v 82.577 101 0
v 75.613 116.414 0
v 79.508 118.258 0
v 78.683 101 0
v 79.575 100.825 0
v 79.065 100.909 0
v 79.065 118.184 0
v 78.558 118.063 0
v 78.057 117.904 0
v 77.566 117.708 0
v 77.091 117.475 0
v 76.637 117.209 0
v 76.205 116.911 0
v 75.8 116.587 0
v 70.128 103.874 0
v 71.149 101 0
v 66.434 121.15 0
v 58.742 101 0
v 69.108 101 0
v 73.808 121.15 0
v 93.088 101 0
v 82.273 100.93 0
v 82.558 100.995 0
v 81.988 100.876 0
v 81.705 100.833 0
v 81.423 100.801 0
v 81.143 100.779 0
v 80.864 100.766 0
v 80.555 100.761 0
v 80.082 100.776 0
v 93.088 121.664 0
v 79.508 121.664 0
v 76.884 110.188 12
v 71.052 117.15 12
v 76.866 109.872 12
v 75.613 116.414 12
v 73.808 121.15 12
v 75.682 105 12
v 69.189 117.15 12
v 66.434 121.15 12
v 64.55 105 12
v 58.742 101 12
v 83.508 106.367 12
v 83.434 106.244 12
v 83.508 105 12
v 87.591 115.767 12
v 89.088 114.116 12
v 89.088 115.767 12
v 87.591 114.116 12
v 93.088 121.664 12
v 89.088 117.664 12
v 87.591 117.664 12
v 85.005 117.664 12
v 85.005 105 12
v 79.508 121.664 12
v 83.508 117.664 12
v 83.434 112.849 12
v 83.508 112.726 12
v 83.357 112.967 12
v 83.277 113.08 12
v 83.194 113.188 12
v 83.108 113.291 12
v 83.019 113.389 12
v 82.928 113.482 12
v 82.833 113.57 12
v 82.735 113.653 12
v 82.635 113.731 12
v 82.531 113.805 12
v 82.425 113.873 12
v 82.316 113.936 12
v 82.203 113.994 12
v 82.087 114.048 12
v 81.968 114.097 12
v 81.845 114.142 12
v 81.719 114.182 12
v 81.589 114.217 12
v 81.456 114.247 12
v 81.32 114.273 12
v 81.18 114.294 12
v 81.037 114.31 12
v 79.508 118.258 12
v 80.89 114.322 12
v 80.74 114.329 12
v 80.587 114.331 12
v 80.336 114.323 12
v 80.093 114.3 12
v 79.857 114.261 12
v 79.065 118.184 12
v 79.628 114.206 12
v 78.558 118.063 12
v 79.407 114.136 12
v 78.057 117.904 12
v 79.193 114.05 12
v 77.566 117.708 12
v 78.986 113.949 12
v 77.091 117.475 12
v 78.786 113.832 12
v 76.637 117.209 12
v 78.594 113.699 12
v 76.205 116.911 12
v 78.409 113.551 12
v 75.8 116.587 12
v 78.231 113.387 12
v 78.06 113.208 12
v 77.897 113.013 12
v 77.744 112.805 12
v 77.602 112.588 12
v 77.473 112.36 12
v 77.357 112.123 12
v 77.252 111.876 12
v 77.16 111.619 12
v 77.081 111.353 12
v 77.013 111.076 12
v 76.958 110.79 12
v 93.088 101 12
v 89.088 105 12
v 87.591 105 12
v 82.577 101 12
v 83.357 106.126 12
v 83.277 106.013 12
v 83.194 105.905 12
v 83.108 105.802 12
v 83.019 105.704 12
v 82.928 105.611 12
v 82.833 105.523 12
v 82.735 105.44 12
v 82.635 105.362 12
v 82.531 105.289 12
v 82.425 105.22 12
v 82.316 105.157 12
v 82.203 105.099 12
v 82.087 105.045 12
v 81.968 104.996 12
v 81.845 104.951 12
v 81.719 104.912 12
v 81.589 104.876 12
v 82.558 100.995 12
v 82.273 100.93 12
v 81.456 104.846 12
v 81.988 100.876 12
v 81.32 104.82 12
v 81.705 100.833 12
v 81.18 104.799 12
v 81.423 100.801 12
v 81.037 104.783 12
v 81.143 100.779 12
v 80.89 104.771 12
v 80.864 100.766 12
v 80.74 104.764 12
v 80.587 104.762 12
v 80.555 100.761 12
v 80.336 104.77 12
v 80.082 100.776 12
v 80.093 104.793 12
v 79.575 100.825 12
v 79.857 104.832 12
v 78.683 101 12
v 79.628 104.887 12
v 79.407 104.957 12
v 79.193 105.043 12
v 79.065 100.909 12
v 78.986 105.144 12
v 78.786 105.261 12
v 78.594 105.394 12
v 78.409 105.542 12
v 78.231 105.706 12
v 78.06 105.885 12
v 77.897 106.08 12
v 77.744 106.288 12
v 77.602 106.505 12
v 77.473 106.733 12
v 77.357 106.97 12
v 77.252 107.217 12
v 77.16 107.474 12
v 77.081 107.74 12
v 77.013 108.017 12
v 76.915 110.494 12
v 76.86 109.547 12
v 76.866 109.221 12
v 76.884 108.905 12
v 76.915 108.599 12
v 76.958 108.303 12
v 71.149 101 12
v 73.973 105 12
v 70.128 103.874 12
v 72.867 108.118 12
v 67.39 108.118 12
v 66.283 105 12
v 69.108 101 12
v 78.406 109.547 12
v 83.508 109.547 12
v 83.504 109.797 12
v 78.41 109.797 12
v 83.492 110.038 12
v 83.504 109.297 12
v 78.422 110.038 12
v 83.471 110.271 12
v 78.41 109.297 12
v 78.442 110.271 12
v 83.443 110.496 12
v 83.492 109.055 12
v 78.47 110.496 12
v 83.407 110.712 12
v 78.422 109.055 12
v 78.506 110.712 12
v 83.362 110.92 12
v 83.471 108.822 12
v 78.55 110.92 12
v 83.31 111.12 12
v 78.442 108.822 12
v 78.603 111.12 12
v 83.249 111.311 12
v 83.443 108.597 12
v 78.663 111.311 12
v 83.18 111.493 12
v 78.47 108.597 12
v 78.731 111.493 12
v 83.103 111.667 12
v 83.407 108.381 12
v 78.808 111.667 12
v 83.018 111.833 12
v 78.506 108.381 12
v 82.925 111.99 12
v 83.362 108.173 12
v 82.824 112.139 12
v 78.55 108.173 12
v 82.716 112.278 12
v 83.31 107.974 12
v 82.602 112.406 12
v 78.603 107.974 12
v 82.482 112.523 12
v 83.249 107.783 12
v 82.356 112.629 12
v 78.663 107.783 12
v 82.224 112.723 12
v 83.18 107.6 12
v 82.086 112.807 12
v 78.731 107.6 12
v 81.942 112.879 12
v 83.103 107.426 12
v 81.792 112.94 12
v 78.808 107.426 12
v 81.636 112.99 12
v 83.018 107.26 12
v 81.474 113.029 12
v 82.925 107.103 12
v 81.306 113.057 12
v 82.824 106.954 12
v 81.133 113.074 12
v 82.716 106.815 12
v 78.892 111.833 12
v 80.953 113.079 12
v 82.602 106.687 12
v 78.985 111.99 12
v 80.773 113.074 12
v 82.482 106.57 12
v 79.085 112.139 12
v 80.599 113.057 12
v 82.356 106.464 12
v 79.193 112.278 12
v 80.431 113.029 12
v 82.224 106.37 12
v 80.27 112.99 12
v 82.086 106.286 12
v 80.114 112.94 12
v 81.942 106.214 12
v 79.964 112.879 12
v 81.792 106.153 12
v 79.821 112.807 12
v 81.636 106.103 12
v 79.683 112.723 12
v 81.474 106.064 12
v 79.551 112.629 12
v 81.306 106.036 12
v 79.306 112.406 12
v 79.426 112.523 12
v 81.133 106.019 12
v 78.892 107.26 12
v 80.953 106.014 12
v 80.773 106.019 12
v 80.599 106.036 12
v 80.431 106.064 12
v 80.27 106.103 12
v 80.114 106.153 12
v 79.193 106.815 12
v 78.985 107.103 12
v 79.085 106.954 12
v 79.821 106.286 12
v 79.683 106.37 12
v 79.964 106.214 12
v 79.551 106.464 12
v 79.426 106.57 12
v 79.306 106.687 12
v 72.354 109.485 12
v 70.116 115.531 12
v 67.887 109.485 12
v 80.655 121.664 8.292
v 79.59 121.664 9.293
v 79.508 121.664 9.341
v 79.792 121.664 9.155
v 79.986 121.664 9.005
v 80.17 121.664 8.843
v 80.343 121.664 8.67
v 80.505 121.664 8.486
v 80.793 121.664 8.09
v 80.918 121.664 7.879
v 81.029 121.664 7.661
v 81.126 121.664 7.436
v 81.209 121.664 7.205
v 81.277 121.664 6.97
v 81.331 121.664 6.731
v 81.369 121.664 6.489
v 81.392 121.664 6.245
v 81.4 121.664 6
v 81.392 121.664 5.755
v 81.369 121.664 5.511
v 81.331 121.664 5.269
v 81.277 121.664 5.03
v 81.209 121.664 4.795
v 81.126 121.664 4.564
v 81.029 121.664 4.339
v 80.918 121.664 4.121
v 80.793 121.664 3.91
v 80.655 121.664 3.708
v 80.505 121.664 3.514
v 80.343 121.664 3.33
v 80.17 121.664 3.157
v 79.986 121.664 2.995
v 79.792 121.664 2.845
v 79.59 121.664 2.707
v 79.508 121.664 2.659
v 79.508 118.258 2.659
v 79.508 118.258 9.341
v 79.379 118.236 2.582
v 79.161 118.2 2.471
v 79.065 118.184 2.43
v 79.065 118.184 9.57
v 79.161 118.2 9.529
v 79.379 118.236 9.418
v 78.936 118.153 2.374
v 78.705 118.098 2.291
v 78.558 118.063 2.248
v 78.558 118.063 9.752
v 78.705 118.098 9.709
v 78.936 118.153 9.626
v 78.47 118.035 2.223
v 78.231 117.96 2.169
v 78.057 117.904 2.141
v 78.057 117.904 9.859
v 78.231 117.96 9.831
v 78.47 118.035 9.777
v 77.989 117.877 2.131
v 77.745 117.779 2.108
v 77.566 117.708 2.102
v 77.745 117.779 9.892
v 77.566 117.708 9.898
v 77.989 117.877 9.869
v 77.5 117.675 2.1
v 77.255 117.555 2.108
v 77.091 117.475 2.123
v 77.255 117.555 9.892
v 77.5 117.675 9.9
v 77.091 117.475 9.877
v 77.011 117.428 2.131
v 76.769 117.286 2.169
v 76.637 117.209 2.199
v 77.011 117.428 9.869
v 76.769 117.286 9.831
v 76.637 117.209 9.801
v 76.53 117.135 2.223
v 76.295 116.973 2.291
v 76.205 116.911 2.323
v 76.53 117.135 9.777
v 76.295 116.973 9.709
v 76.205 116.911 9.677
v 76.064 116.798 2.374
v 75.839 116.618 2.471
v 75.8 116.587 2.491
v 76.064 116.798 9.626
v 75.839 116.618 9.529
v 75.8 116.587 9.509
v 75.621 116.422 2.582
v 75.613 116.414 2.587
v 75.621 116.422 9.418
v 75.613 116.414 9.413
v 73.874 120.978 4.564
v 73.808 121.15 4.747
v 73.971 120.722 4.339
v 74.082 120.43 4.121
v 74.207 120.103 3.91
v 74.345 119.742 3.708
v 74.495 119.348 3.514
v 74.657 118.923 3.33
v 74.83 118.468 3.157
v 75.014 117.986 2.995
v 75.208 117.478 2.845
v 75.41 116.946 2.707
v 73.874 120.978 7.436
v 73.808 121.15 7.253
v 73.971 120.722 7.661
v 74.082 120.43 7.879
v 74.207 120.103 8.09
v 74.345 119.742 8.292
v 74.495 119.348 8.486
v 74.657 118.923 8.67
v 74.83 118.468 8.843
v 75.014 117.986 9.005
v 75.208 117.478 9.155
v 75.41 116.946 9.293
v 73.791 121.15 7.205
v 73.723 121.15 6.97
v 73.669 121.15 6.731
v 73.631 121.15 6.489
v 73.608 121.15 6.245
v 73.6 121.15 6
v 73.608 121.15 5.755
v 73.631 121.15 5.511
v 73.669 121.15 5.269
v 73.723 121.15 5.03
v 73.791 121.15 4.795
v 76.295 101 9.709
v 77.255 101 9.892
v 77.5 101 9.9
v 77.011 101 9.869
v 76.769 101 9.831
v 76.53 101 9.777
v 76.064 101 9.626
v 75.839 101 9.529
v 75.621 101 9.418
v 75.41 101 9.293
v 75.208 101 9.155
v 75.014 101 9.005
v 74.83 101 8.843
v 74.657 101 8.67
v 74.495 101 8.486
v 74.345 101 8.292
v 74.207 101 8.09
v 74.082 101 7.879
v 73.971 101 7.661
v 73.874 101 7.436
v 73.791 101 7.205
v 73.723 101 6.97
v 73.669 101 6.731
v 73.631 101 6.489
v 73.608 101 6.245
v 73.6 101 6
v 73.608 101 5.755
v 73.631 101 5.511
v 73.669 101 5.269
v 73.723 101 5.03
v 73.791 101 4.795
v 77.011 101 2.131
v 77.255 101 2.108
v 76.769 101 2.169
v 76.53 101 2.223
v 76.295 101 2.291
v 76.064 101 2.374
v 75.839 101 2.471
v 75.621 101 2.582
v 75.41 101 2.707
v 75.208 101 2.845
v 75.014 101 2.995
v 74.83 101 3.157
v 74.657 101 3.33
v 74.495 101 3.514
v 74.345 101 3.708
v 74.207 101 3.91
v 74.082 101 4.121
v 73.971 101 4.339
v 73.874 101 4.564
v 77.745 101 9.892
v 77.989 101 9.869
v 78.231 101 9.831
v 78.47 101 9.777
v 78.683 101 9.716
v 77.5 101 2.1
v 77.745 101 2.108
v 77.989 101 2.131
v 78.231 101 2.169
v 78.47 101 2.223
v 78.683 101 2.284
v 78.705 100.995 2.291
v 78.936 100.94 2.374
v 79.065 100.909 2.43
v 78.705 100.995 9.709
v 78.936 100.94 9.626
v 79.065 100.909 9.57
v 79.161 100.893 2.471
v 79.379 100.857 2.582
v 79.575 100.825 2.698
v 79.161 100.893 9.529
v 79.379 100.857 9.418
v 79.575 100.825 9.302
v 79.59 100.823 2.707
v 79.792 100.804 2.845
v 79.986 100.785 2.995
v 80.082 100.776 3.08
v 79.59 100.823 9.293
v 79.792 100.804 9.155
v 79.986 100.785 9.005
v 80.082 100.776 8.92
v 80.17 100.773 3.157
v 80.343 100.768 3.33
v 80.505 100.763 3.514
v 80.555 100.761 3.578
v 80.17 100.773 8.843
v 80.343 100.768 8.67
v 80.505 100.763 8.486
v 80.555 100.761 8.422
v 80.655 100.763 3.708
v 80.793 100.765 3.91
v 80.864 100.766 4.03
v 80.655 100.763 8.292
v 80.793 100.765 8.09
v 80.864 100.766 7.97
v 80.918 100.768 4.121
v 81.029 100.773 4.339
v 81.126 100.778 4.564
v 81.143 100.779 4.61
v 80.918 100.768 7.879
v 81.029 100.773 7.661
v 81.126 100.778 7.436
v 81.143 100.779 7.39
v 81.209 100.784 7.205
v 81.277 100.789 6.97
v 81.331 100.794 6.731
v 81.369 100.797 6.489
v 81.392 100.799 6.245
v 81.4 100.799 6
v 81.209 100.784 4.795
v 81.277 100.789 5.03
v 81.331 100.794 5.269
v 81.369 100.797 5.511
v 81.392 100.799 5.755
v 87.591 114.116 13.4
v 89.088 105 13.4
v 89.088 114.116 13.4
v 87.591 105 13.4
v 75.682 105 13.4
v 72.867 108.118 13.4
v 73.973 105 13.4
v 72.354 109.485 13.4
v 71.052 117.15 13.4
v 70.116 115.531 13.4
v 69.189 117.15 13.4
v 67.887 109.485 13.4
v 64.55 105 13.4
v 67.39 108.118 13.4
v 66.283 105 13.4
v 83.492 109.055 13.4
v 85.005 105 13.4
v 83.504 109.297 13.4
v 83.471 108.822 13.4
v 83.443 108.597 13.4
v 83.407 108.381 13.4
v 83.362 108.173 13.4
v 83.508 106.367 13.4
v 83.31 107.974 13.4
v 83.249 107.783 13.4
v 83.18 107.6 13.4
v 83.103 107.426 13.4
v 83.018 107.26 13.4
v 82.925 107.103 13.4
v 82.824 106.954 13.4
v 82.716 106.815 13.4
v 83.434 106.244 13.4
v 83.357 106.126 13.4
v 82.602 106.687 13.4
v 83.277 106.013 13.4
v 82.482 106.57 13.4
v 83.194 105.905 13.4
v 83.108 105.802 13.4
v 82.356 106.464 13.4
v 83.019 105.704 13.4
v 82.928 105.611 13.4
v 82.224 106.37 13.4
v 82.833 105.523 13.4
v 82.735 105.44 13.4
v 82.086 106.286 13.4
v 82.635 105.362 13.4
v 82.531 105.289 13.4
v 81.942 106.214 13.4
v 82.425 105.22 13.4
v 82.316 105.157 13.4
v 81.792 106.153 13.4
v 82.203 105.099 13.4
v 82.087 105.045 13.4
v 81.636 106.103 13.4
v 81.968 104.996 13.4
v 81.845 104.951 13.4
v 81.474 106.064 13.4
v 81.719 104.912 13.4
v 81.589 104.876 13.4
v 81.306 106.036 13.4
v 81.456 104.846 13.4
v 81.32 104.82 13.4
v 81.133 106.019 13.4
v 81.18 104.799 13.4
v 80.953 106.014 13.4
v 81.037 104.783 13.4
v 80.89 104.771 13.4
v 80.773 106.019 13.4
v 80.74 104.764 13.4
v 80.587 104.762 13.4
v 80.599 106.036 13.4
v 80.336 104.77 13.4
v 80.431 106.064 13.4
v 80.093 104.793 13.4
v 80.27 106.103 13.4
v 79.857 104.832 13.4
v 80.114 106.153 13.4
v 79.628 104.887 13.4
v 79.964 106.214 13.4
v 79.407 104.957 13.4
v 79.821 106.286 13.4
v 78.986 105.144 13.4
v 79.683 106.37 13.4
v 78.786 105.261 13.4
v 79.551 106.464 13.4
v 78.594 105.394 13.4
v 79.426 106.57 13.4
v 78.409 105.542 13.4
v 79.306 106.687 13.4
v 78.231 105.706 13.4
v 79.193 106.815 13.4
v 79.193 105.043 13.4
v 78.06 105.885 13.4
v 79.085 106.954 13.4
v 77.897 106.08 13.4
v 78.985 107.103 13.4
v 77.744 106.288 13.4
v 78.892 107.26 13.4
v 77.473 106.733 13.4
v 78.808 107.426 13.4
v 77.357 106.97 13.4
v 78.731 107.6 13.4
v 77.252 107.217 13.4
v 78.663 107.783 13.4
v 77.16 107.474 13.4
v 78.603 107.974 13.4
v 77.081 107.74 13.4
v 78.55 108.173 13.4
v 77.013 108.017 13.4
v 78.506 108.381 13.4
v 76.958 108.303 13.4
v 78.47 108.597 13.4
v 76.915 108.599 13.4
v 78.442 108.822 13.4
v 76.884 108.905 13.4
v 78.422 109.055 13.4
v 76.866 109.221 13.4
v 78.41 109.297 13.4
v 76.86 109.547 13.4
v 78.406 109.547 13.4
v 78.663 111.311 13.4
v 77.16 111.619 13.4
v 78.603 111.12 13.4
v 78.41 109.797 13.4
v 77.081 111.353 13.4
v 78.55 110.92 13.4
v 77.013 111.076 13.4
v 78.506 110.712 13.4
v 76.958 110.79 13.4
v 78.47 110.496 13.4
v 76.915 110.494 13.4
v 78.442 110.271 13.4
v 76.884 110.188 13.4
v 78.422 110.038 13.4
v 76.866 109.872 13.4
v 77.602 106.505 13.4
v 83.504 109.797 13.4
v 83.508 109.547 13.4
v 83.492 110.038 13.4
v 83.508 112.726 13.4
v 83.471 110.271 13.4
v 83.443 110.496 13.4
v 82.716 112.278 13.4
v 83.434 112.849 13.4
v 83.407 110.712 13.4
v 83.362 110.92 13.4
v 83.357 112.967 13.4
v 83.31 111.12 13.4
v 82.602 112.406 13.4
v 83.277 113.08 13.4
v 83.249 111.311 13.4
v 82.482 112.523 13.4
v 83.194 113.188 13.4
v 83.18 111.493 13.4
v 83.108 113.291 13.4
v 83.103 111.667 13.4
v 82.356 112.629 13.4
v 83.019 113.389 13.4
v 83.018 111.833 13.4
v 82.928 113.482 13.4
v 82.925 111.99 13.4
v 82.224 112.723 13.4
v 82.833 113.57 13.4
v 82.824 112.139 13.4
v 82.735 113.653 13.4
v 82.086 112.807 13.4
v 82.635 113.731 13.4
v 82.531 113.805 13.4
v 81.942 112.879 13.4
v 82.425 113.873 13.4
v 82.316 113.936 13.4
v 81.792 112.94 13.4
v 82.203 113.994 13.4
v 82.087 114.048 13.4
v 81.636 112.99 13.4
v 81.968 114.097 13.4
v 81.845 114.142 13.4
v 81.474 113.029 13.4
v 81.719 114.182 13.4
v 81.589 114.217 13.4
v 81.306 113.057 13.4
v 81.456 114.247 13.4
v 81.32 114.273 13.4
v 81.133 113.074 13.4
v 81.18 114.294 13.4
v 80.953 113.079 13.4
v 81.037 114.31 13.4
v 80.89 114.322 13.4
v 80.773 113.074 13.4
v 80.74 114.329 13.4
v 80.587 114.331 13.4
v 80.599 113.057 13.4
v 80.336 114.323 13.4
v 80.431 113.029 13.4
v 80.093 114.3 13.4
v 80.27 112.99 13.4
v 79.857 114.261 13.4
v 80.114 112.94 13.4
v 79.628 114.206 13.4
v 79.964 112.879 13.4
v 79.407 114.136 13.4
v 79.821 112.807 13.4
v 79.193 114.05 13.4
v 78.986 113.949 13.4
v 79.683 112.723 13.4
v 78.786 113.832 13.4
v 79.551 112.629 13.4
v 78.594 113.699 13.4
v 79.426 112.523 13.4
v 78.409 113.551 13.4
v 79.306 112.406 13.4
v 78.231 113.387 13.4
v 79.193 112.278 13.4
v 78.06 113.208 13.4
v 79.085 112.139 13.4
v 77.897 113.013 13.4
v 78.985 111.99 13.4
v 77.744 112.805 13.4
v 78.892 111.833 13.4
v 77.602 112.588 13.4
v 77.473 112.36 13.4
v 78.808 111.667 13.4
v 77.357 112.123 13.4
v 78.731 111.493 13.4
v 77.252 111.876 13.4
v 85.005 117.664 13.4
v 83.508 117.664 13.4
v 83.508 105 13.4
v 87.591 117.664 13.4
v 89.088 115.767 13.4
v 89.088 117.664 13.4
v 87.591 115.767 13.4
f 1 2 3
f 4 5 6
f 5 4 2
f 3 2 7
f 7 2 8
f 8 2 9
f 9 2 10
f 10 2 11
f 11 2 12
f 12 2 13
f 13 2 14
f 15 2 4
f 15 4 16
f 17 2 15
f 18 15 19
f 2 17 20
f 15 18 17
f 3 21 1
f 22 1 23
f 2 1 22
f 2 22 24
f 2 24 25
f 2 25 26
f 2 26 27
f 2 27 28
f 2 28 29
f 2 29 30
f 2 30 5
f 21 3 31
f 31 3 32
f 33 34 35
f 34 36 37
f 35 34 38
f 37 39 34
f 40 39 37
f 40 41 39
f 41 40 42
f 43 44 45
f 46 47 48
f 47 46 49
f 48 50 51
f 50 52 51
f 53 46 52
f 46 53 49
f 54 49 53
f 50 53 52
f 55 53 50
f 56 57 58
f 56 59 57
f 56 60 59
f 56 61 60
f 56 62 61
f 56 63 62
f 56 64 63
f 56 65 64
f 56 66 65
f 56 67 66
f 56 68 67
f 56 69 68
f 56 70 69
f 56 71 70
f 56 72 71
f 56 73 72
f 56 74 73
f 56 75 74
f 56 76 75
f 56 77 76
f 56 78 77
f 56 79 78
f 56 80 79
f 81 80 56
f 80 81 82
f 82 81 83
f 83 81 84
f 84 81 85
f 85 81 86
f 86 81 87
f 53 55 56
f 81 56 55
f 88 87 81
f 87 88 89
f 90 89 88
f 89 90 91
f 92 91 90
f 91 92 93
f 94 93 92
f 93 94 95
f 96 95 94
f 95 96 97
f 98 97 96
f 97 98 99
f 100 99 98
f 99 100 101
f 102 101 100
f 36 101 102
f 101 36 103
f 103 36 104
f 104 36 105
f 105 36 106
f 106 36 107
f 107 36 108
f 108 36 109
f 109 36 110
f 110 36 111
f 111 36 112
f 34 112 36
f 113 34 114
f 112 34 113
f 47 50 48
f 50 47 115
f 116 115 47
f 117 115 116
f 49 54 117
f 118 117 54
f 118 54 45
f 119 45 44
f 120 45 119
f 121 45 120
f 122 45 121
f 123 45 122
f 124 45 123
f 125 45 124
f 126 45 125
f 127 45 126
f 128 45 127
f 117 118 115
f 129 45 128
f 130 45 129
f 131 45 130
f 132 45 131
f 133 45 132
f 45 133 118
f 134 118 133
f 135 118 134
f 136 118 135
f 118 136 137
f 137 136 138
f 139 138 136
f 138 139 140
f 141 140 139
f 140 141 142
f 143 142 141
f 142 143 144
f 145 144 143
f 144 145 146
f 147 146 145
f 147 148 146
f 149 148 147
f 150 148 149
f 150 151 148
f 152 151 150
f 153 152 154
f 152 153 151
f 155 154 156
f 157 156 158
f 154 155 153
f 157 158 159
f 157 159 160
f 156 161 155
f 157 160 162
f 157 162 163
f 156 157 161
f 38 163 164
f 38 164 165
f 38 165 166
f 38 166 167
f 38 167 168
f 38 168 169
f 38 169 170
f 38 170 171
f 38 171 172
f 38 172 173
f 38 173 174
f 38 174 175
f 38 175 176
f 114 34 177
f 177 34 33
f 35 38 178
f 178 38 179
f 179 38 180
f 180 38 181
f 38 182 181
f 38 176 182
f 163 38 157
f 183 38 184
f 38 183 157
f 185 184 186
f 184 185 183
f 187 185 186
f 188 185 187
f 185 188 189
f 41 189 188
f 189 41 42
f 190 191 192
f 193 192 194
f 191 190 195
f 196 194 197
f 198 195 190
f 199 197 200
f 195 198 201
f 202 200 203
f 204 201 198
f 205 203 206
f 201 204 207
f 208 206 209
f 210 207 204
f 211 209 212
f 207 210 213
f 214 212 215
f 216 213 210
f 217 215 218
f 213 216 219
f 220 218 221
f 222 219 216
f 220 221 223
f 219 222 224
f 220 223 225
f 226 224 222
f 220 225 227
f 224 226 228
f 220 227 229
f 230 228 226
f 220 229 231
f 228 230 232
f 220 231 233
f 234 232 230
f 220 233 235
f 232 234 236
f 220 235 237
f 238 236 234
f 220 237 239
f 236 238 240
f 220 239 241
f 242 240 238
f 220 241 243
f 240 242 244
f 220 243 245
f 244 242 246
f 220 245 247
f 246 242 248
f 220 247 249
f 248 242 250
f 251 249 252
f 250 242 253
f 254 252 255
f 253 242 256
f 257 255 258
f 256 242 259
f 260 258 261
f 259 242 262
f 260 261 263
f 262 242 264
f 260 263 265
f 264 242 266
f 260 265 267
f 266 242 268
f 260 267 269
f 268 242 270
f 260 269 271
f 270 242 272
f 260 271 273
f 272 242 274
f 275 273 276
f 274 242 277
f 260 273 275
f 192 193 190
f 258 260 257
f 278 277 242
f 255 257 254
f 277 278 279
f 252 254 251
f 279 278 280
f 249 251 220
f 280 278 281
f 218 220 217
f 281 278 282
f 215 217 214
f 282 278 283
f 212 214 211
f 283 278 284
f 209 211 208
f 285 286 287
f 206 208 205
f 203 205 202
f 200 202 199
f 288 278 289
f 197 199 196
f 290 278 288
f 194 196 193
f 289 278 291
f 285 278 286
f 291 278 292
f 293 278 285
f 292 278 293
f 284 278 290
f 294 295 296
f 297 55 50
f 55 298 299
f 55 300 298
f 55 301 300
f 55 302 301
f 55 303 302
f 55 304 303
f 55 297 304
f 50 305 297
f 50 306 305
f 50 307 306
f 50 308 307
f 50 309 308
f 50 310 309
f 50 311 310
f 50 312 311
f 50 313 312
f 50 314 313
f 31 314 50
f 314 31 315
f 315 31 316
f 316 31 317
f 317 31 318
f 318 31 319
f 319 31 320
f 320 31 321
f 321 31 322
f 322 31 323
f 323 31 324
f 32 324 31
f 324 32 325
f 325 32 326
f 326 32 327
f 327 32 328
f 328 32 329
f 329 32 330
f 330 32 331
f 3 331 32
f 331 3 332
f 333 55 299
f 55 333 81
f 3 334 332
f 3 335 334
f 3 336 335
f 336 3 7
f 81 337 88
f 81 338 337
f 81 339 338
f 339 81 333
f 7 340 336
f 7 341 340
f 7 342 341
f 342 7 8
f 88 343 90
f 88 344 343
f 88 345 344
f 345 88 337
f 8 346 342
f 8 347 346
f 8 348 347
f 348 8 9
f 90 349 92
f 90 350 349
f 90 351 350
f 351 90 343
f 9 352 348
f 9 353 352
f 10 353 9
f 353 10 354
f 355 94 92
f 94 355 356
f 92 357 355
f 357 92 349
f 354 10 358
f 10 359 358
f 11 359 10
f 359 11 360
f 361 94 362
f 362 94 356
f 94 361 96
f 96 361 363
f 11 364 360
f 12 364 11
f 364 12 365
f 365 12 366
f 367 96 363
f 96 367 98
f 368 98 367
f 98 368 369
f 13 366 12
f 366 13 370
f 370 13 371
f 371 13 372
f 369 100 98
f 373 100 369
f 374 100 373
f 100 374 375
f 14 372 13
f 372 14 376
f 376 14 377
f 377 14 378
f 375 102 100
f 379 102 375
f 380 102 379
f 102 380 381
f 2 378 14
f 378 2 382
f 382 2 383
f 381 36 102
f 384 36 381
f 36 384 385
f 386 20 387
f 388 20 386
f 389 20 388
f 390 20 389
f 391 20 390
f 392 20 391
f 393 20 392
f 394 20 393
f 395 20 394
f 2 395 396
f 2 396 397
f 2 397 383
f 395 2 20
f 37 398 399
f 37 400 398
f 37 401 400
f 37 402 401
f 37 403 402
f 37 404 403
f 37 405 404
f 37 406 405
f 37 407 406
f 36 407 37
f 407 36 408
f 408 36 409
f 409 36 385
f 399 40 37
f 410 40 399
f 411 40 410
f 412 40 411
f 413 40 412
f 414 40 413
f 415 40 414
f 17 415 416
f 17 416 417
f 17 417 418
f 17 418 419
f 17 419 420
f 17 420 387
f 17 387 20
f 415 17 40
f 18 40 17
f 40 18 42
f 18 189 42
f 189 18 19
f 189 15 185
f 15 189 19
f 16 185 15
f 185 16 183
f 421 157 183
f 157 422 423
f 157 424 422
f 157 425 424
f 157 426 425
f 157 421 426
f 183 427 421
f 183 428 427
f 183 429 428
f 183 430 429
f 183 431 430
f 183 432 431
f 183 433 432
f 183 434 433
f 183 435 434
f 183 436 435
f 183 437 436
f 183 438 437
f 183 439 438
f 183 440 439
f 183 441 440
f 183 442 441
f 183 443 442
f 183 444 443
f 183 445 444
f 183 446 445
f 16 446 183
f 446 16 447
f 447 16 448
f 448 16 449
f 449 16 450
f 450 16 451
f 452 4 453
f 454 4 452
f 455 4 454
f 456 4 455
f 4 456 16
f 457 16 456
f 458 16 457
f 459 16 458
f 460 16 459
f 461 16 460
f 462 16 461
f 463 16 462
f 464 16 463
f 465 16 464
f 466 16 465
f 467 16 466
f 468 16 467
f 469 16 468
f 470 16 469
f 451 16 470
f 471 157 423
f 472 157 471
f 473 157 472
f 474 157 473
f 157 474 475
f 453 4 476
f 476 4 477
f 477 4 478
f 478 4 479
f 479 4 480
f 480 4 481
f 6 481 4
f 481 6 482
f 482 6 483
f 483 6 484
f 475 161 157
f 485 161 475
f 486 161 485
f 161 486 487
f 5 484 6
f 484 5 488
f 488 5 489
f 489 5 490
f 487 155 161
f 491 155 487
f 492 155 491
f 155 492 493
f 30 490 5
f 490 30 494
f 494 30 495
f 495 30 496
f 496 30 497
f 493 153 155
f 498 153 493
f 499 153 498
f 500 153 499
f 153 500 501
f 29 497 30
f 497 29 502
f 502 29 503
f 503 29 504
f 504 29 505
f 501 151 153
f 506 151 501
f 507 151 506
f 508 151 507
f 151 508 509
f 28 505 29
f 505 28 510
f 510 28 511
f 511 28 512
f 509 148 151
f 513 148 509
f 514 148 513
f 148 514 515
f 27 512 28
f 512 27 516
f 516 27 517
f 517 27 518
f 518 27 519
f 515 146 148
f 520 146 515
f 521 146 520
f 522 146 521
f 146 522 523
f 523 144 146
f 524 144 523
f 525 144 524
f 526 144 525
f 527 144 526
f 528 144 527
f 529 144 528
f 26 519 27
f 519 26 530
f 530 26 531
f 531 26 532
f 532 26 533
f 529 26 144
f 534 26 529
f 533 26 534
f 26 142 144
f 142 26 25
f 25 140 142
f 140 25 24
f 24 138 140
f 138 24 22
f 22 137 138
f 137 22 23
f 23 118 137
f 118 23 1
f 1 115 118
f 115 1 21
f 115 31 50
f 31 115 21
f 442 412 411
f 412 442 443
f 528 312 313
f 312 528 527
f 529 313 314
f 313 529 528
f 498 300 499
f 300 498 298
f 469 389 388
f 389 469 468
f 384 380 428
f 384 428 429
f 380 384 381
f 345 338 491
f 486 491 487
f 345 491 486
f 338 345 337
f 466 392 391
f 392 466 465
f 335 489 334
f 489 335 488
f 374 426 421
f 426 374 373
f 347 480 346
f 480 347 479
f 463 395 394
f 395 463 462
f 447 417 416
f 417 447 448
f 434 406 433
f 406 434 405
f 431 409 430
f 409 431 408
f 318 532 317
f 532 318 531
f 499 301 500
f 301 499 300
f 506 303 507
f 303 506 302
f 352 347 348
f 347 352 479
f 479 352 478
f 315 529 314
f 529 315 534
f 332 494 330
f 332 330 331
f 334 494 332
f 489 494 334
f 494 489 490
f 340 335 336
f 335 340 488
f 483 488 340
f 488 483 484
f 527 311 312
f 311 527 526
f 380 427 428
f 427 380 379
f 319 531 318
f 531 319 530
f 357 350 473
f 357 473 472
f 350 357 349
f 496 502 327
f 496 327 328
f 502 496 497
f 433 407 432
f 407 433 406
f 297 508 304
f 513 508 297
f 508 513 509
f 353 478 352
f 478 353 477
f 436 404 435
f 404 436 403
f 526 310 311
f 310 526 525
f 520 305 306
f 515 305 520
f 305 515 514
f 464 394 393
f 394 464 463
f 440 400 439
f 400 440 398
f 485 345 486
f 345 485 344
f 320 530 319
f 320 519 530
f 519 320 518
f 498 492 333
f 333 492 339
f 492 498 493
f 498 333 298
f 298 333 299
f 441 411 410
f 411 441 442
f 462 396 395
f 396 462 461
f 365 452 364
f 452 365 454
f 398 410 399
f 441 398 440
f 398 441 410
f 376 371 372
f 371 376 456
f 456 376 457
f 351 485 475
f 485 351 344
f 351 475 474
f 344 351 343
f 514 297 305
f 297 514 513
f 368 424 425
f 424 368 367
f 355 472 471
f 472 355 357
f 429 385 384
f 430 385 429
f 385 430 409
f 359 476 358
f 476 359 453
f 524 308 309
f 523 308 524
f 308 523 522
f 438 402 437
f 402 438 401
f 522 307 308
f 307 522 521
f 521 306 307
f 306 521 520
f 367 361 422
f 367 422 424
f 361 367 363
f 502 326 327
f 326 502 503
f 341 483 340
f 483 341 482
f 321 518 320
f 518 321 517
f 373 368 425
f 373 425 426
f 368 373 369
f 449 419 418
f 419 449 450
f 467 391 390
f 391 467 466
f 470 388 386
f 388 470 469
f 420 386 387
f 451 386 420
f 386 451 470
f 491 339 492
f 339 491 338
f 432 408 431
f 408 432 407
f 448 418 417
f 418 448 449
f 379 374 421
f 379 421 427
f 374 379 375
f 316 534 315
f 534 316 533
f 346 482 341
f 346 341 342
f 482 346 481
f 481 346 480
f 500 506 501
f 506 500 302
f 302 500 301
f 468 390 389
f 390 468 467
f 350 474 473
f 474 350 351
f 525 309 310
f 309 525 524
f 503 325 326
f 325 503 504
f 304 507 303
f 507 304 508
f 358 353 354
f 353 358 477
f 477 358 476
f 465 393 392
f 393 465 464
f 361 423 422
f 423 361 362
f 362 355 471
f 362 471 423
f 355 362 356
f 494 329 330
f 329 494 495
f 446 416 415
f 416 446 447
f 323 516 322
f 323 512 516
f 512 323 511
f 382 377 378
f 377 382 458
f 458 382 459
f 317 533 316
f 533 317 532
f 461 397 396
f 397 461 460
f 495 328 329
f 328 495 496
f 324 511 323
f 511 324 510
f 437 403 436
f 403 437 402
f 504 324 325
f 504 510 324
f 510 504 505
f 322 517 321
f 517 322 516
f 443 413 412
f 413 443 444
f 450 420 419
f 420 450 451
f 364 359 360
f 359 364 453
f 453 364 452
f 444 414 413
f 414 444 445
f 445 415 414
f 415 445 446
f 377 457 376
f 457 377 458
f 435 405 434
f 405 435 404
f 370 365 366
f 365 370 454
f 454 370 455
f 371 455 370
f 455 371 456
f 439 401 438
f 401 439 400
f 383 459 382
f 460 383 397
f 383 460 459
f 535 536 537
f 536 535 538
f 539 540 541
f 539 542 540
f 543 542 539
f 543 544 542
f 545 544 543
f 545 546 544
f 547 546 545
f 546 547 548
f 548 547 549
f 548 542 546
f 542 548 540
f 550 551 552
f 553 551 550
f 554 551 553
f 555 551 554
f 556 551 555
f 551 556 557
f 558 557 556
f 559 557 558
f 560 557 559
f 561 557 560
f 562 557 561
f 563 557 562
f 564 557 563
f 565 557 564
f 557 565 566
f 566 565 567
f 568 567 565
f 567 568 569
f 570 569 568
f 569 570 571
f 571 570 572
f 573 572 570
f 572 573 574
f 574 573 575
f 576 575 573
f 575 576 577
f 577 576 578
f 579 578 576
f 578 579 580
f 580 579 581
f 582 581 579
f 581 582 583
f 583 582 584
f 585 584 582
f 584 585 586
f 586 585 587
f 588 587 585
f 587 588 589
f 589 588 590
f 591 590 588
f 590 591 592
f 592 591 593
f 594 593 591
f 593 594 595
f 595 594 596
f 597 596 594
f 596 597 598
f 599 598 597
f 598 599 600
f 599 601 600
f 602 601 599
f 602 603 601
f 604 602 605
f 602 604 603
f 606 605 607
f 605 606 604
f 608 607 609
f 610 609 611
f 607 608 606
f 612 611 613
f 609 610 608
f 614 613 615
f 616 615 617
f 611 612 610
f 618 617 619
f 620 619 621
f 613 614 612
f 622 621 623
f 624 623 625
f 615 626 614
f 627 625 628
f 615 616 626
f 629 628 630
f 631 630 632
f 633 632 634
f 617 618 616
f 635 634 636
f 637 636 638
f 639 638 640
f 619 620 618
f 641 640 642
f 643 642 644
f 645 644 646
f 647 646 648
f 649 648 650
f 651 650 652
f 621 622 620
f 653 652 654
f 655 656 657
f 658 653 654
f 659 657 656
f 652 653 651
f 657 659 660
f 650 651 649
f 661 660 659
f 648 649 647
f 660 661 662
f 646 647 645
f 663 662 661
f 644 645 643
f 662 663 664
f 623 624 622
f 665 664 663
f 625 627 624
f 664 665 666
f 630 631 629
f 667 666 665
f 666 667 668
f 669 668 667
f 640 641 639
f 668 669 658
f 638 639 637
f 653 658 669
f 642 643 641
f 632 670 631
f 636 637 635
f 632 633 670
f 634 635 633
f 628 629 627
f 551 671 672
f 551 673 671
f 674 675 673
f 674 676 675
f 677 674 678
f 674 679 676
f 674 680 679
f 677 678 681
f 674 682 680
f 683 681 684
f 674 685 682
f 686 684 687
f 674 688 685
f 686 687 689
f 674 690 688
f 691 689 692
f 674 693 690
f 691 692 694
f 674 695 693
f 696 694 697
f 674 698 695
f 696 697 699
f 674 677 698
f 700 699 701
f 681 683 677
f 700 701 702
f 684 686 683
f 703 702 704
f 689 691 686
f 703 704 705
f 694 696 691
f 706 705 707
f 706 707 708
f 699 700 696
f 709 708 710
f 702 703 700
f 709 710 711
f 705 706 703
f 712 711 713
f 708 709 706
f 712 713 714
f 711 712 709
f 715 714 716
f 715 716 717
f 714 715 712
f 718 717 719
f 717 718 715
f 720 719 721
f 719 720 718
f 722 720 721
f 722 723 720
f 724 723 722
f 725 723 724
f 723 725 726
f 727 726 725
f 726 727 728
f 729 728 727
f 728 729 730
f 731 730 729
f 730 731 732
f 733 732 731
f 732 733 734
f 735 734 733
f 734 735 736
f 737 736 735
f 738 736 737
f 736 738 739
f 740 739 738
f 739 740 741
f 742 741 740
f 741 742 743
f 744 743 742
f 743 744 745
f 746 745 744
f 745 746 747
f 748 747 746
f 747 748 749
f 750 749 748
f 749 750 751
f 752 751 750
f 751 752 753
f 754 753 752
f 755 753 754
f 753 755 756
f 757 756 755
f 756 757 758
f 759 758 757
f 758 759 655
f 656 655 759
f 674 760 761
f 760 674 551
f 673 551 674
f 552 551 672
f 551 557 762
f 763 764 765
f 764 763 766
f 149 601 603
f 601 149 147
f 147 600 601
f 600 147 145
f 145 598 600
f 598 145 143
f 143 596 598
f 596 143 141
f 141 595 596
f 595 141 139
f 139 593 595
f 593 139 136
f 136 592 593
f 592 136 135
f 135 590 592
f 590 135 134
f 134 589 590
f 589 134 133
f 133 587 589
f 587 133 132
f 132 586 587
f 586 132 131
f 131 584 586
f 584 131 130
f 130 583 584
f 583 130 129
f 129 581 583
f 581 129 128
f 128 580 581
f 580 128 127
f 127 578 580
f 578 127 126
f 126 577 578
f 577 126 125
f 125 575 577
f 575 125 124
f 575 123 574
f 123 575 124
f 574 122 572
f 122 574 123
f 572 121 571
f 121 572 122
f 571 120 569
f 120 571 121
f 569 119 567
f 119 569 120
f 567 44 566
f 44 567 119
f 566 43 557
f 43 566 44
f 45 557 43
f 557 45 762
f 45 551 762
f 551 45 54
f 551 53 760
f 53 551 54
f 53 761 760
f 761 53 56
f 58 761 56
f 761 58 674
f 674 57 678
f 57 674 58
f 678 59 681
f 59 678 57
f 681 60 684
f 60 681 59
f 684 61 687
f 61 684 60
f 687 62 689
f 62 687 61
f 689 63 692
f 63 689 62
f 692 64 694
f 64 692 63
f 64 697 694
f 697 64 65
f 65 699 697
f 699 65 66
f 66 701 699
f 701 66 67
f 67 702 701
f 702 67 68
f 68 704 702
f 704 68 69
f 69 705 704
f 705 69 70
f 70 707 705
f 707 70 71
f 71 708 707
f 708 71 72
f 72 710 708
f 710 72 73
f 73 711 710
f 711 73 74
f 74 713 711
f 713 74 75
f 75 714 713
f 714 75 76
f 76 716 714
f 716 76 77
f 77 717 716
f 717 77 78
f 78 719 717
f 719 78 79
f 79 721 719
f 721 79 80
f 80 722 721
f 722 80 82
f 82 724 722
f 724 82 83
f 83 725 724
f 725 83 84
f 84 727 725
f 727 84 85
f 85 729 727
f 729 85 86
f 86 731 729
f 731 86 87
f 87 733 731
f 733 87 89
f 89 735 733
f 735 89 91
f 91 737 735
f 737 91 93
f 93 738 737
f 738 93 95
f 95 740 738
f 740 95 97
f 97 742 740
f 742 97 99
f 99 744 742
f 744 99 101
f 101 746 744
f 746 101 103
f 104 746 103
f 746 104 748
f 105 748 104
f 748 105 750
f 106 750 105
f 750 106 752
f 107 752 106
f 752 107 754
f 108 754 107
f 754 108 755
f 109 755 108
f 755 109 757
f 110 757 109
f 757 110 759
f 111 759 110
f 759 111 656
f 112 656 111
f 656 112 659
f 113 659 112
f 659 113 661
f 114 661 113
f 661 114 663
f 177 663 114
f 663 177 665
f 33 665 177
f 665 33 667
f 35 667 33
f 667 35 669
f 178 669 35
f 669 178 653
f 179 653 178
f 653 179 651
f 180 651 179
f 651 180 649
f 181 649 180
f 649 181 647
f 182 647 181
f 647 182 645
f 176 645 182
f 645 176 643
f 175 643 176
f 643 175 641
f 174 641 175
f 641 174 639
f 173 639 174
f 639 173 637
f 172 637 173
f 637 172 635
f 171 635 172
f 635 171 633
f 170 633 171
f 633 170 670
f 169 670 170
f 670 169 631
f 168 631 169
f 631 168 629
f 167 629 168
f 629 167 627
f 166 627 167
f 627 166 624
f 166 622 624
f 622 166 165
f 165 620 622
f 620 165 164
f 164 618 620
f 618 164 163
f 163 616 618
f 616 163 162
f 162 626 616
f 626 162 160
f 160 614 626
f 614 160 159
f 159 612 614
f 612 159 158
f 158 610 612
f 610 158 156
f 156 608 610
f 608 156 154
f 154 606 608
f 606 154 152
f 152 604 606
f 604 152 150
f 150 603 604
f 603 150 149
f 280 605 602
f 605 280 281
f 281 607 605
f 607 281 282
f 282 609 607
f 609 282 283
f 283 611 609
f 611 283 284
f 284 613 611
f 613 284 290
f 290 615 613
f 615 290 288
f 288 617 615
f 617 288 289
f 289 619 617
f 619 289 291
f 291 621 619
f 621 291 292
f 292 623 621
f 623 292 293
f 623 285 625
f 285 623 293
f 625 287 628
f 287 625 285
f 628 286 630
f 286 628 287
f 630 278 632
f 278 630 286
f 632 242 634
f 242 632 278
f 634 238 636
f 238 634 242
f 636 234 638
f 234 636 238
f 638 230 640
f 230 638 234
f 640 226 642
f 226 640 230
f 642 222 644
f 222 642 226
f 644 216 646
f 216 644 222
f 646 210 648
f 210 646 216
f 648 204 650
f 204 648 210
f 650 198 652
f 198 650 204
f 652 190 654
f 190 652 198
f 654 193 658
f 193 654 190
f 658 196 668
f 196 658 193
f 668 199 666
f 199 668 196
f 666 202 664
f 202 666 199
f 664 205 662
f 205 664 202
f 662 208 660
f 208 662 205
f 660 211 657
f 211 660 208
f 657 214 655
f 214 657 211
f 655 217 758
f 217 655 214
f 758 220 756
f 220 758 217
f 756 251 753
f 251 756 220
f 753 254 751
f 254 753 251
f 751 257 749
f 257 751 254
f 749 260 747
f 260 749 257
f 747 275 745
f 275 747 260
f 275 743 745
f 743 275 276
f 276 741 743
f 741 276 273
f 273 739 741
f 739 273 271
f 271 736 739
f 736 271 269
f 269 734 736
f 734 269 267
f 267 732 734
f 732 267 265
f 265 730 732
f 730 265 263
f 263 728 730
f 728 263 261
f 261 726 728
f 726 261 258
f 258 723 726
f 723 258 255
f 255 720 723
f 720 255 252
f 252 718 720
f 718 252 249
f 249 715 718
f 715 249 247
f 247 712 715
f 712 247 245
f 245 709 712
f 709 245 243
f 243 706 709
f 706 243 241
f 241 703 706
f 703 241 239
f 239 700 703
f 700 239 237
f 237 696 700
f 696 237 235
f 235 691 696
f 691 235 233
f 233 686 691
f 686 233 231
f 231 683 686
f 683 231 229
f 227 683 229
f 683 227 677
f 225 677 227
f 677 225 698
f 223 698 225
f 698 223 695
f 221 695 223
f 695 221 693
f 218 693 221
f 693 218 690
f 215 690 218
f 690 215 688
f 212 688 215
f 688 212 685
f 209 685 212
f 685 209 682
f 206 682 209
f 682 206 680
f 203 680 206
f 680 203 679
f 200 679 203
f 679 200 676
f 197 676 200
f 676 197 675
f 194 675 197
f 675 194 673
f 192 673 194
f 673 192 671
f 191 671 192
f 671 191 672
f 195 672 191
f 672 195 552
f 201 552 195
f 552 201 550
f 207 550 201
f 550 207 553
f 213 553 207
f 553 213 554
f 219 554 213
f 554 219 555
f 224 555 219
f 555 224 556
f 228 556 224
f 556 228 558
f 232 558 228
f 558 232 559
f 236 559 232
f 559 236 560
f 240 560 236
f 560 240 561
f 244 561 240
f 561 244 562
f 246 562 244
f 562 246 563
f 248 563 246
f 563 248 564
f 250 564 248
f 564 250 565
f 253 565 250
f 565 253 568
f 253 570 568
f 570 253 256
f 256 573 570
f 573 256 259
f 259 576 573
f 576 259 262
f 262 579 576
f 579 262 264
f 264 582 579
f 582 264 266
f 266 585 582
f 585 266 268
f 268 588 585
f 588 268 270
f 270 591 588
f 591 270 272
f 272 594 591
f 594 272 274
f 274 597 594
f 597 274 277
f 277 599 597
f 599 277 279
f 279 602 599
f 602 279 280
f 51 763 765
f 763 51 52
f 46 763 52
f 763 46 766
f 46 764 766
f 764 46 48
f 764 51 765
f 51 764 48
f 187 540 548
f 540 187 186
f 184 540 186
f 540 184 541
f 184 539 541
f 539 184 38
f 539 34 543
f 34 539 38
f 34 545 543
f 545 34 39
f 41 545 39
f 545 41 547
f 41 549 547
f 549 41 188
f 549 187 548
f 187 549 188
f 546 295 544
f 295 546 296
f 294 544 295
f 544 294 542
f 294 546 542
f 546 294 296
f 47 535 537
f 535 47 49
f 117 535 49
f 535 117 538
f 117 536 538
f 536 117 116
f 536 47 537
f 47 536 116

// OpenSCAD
// =========================================================================
//   MULTI-NAME TOPPER (FIX PERFECT CENTER + Calibrated Spacing)
// =========================================================================

grid_cols = 2;
/* [Nama] */
nama_1  = "Adi";
nama_2  = "";
nama_3  = "";
nama_4  = "";
nama_5  = "";
nama_6  = "";
nama_7  = "";
nama_8  = "";
nama_9  = "";
nama_10 = "";

/* [Warna] */ 
base_color_name = "Peak Green"; // [Yellow, White, Sky Blue, Red, Peak Green, Orange, Grape Purple, Black, Beige, Barbie Pink] 
letters_color_name = "White"; // [Yellow, White, Sky Blue, Red, Peak Green, Orange, Grape Purple, Black, Beige, Barbie Pink]

/* [Settings] */
font_name        = "Bagel Fat One"; // font [Bagel Fat One, Chewy, Courgette, Dancing Script, Lemon, Lobster, Pacifico, Playfair, Lily Script One, Sacramento, Bubblegum Sans, DynaPuff, Alkatra, Archivo, Sour Gummy, Shrikhand]
letter_height    = 12;
letter_thickness = 1.4;
base_height      = 12;
outline_margin   = 4;

hole_orientation = "TOPBOTTOM"; // ["TOPBOTTOM", "FRONTBACK"]
hole_diameter    = 7.8;
hole_length      = 200;

hole_y = 4;
hole_z = base_height / 2;

// Width scale for individual character layout (used when ligature is detected)
Width_Scale       = 1.0;   // [0.8:0.02:1.5]
// Extra space between characters for ligatures ff / fi / fl
Ligature_Extra    = 1.5;   // [0:0.1:5]

/* [Font Spacing Calibration] */
// Metode perhitungan jarak (0 = Metode Asli, 1 = Metode Rata-rata/Average)
Spacing_Method    = 0; // [0: Asli, 1: Rata-Rata]

// Jenis tabel lebar huruf (0 = Kalibrasi v6 Teroptimasi, 1 = Kustom 0.70)
Table_Type        = 0; // [0: Kalibrasi v6, 1: Kustom 0.70]

/* [Layout Grid] */
bed_x = 235;
bed_y = 235;


gap_x = 10;
gap_y = 10;

slot_w = 70;
slot_h = 25;

/* ===============================
   COLOR
   =============================== */
function getColor(name) =
    name == "Yellow"       ? "#FFD700" :
    name == "White"        ? "#FFFFFF" :
    name == "Sky Blue"     ? "#87CEEB" :
    name == "Red"          ? "#FF0000" :
    name == "Peak Green"   ? "#00C853" :
    name == "Orange"       ? "#FF6A00" :
    name == "Grape Purple" ? "#6A0DAD" :
    name == "Black"        ? "#000000" :
    name == "Beige"        ? "#F5F5DC" :
    name == "Barbie Pink"  ? "#FF69B4" :
    "#FFFFFF";

base_color    = getColor(base_color_name);
letters_color = getColor(letters_color_name);
$fn = 100;

// Alias to match keychain calibration variable names
Font_Size = letter_height;

// ─────────────────────────────────────────────
// LOOKUP TABLE FOR CHARACTER WIDTHS
// ─────────────────────────────────────────────
function char_w_raw(c, type) =
    type == 0 ? (
        // Kalibrasi v6 Teroptimasi (Fiks Pilihan User)
        c=="A" ? 0.96 : c=="B" ? 0.80 : c=="C" ? 0.84 :
        c=="D" ? 0.84 : c=="E" ? 0.86 : c=="F" ? 0.76 :
        c=="G" ? 0.86 : c=="H" ? 0.93 : c=="I" ? 0.4  :
        c=="J" ? 0.76 : c=="K" ? 0.92 : c=="L" ? 0.74 :
        c=="M" ? 1.20 : c=="N" ? 0.98 : c=="O" ? 0.90 :
        c=="P" ? 0.88 : c=="Q" ? 0.90 : c=="R" ? 0.92 :
        c=="S" ? 0.90 : c=="T" ? 0.74 : c=="U" ? 0.86 :
        c=="V" ? 0.84 : c=="W" ? 1.14 : c=="X" ? 0.80 :
        c=="Y" ? 0.78 : c=="Z" ? 0.78 :
        c=="a" ? 0.78 : c=="b" ? 0.76 : c=="c" ? 0.74 :
        c=="d" ? 0.84 : c=="e" ? 0.76 : c=="f" ? 0.54 :
        c=="g" ? 0.76 : c=="h" ? 0.78 : c=="i" ? 0.38 : // Dioptimasi agar huruf setelah 'i' tidak menempel
        c=="j" ? 0.44 : c=="k" ? 0.84 : c=="l" ? 0.38 : // Dioptimasi agar huruf setelah 'l' tidak menempel
        c=="m" ? 1.14 : c=="n" ? 0.78 : c=="o" ? 0.78 :
        c=="p" ? 0.76 : c=="q" ? 0.86 : c=="r" ? 0.70 : // Dioptimasi agar 'rn' tidak menempel
        c=="s" ? 0.76 : c=="t" ? 0.70 : c=="u" ? 0.84 : // Dioptimasi agar 'sh' tidak menempel
        c=="v" ? 0.74 : c=="w" ? 0.94 : c=="x" ? 0.70 :
        c=="y" ? 0.74 : c=="z" ? 0.80 : 
        c=="." ? 0.10 :
        c==" " ? 0.50 : 0.76
    ) : (
        // Kustom 0.70
        c=="A" ? 0.96 : c=="B" ? 0.80 : c=="C" ? 0.84 :
        c=="D" ? 0.84 : c=="E" ? 0.76 : c=="F" ? 0.76 :
        c=="G" ? 0.86 : c=="H" ? 0.86 : c=="I" ? 0.4  :
        c=="J" ? 0.56 : c=="K" ? 0.82 : c=="L" ? 0.74 :
        c=="M" ? 1.00 : c=="N" ? 0.98 : c=="O" ? 0.90 :
        c=="P" ? 0.78 : c=="Q" ? 0.90 : c=="R" ? 0.92 :
        c=="S" ? 0.76 : c=="T" ? 0.74 : c=="U" ? 0.86 :
        c=="V" ? 0.84 : c=="W" ? 1.04 : c=="X" ? 0.80 :
        c=="Y" ? 0.78 : c=="Z" ? 0.78 :
        c=="a" ? 0.78 : c=="b" ? 0.70 : c=="c" ? 0.70 :
        c=="d" ? 0.70 : c=="e" ? 0.70 : c=="f" ? 0.54 :
        c=="g" ? 0.70 : c=="h" ? 0.70 : c=="i" ? 0.36 :
        c=="j" ? 0.70 : c=="k" ? 0.70 : c=="l" ? 0.70 :
        c=="m" ? 0.70 : c=="n" ? 0.70 : c=="o" ? 0.70 :
        c=="p" ? 0.70 : c=="q" ? 0.70 : c=="r" ? 0.70 :
        c=="s" ? 0.70 : c=="t" ? 0.70 : c=="u" ? 0.70 :
        c=="v" ? 0.70 : c=="w" ? 0.70 : c=="x" ? 0.70 :
        c=="y" ? 0.70 : c=="z" ? 0.70 :
        c==" " ? 0.50 : 0.76
    );

function char_w(c) = char_w_raw(c, Table_Type);

// ─────────────────────────────────────────────
// DETEKSI & LOGIC LIGATURE
// ─────────────────────────────────────────────

function is_ligature(prev, cur) =
    prev == "f" && (cur == "f" || cur == "i" || cur == "l");

function cx(word, idx) =
    idx == 0 ? 0 :
    cx(word, idx-1)
    + (
        Spacing_Method == 0 ? 
        char_w(word[idx-1]) * Font_Size * Width_Scale : 
        ((char_w(word[idx-1]) + char_w(word[idx])) / 2) * Font_Size * Width_Scale
    )
    + (is_ligature(word[idx-1], word[idx]) ? Ligature_Extra : 0);

function get_word_width(word) =
    len(word) == 0 ? 0 :
    cx(word, len(word)-1) + char_w(word[len(word)-1]) * Font_Size * Width_Scale;

// Merender kata huruf demi huruf dengan baseline vertikal sejajar
module render_chars(word) {
    for (i = [0 : len(word) - 1]) {
        translate([cx(word, i), 0, 0])
            text(word[i], size = Font_Size, font = font_name, valign = "baseline");
    }
}

// Merender baris secara per-karakter agar perhitungan koordinat spasi 100% sinkron (Center Align)
module render_line(word) {
    align_shift = -get_word_width(word) / 2;
    translate([align_shift, 0, 0])
        render_chars(word);
}

/* ===============================
   MODULES (CENTER FIX)
   =============================== */
module base_with_tunnel(text_string) {
    difference() {
        linear_extrude(height = base_height)
            offset(delta = outline_margin)
                render_line(text_string);

        // HOLE SELALU DI TENGAH REAL
        if (hole_orientation == "TOPBOTTOM") {
            translate([ 0, 0, hole_z ])
                rotate([ 90, 0, 0 ])
                    cylinder(d = hole_diameter, h = hole_length, center = true);
        }
        else if (hole_orientation == "FRONTBACK") {
            translate([ 0, hole_y, hole_z ])
                rotate([ 0, 90, 0 ])
                    cylinder(d = hole_diameter, h = hole_length, center = true);
        }
    }
}

module raised_letters(text_string) {
    translate([ 0, 0, base_height ])
        linear_extrude(height = letter_thickness)
            render_line(text_string);
}

module name_topper(text_string) {
    color(base_color)    base_with_tunnel(text_string);
    color(letters_color) raised_letters(text_string);
}

/* ===============================
   GENERATE GRID
   =============================== */
nama_all = [
    nama_1, nama_2, nama_3, nama_4, nama_5,
    nama_6, nama_7, nama_8, nama_9, nama_10
];

filled = [for (n = nama_all) if (n != "") n];
total  = len(filled);

grid_rows = ceil(total / grid_cols);

total_w = grid_cols * slot_w + (grid_cols - 1) * gap_x;
total_h = grid_rows * slot_h + (grid_rows - 1) * gap_y;

start_x = (bed_x - total_w) / 2;
start_y = (bed_y - total_h) / 2;

/* ===============================
   LOOP RENDER
   =============================== */
for (idx = [0 : total - 1]) {
    col = idx % grid_cols;
    row = floor(idx / grid_cols);

    // karena text sudah center di (0,0)
    x = start_x + col * (slot_w + gap_x) + slot_w / 2;
    y = start_y + (grid_rows - 1 - row) * (slot_h + gap_y);

    translate([ x, y, 0 ])
        name_topper(filled[idx]);
}
